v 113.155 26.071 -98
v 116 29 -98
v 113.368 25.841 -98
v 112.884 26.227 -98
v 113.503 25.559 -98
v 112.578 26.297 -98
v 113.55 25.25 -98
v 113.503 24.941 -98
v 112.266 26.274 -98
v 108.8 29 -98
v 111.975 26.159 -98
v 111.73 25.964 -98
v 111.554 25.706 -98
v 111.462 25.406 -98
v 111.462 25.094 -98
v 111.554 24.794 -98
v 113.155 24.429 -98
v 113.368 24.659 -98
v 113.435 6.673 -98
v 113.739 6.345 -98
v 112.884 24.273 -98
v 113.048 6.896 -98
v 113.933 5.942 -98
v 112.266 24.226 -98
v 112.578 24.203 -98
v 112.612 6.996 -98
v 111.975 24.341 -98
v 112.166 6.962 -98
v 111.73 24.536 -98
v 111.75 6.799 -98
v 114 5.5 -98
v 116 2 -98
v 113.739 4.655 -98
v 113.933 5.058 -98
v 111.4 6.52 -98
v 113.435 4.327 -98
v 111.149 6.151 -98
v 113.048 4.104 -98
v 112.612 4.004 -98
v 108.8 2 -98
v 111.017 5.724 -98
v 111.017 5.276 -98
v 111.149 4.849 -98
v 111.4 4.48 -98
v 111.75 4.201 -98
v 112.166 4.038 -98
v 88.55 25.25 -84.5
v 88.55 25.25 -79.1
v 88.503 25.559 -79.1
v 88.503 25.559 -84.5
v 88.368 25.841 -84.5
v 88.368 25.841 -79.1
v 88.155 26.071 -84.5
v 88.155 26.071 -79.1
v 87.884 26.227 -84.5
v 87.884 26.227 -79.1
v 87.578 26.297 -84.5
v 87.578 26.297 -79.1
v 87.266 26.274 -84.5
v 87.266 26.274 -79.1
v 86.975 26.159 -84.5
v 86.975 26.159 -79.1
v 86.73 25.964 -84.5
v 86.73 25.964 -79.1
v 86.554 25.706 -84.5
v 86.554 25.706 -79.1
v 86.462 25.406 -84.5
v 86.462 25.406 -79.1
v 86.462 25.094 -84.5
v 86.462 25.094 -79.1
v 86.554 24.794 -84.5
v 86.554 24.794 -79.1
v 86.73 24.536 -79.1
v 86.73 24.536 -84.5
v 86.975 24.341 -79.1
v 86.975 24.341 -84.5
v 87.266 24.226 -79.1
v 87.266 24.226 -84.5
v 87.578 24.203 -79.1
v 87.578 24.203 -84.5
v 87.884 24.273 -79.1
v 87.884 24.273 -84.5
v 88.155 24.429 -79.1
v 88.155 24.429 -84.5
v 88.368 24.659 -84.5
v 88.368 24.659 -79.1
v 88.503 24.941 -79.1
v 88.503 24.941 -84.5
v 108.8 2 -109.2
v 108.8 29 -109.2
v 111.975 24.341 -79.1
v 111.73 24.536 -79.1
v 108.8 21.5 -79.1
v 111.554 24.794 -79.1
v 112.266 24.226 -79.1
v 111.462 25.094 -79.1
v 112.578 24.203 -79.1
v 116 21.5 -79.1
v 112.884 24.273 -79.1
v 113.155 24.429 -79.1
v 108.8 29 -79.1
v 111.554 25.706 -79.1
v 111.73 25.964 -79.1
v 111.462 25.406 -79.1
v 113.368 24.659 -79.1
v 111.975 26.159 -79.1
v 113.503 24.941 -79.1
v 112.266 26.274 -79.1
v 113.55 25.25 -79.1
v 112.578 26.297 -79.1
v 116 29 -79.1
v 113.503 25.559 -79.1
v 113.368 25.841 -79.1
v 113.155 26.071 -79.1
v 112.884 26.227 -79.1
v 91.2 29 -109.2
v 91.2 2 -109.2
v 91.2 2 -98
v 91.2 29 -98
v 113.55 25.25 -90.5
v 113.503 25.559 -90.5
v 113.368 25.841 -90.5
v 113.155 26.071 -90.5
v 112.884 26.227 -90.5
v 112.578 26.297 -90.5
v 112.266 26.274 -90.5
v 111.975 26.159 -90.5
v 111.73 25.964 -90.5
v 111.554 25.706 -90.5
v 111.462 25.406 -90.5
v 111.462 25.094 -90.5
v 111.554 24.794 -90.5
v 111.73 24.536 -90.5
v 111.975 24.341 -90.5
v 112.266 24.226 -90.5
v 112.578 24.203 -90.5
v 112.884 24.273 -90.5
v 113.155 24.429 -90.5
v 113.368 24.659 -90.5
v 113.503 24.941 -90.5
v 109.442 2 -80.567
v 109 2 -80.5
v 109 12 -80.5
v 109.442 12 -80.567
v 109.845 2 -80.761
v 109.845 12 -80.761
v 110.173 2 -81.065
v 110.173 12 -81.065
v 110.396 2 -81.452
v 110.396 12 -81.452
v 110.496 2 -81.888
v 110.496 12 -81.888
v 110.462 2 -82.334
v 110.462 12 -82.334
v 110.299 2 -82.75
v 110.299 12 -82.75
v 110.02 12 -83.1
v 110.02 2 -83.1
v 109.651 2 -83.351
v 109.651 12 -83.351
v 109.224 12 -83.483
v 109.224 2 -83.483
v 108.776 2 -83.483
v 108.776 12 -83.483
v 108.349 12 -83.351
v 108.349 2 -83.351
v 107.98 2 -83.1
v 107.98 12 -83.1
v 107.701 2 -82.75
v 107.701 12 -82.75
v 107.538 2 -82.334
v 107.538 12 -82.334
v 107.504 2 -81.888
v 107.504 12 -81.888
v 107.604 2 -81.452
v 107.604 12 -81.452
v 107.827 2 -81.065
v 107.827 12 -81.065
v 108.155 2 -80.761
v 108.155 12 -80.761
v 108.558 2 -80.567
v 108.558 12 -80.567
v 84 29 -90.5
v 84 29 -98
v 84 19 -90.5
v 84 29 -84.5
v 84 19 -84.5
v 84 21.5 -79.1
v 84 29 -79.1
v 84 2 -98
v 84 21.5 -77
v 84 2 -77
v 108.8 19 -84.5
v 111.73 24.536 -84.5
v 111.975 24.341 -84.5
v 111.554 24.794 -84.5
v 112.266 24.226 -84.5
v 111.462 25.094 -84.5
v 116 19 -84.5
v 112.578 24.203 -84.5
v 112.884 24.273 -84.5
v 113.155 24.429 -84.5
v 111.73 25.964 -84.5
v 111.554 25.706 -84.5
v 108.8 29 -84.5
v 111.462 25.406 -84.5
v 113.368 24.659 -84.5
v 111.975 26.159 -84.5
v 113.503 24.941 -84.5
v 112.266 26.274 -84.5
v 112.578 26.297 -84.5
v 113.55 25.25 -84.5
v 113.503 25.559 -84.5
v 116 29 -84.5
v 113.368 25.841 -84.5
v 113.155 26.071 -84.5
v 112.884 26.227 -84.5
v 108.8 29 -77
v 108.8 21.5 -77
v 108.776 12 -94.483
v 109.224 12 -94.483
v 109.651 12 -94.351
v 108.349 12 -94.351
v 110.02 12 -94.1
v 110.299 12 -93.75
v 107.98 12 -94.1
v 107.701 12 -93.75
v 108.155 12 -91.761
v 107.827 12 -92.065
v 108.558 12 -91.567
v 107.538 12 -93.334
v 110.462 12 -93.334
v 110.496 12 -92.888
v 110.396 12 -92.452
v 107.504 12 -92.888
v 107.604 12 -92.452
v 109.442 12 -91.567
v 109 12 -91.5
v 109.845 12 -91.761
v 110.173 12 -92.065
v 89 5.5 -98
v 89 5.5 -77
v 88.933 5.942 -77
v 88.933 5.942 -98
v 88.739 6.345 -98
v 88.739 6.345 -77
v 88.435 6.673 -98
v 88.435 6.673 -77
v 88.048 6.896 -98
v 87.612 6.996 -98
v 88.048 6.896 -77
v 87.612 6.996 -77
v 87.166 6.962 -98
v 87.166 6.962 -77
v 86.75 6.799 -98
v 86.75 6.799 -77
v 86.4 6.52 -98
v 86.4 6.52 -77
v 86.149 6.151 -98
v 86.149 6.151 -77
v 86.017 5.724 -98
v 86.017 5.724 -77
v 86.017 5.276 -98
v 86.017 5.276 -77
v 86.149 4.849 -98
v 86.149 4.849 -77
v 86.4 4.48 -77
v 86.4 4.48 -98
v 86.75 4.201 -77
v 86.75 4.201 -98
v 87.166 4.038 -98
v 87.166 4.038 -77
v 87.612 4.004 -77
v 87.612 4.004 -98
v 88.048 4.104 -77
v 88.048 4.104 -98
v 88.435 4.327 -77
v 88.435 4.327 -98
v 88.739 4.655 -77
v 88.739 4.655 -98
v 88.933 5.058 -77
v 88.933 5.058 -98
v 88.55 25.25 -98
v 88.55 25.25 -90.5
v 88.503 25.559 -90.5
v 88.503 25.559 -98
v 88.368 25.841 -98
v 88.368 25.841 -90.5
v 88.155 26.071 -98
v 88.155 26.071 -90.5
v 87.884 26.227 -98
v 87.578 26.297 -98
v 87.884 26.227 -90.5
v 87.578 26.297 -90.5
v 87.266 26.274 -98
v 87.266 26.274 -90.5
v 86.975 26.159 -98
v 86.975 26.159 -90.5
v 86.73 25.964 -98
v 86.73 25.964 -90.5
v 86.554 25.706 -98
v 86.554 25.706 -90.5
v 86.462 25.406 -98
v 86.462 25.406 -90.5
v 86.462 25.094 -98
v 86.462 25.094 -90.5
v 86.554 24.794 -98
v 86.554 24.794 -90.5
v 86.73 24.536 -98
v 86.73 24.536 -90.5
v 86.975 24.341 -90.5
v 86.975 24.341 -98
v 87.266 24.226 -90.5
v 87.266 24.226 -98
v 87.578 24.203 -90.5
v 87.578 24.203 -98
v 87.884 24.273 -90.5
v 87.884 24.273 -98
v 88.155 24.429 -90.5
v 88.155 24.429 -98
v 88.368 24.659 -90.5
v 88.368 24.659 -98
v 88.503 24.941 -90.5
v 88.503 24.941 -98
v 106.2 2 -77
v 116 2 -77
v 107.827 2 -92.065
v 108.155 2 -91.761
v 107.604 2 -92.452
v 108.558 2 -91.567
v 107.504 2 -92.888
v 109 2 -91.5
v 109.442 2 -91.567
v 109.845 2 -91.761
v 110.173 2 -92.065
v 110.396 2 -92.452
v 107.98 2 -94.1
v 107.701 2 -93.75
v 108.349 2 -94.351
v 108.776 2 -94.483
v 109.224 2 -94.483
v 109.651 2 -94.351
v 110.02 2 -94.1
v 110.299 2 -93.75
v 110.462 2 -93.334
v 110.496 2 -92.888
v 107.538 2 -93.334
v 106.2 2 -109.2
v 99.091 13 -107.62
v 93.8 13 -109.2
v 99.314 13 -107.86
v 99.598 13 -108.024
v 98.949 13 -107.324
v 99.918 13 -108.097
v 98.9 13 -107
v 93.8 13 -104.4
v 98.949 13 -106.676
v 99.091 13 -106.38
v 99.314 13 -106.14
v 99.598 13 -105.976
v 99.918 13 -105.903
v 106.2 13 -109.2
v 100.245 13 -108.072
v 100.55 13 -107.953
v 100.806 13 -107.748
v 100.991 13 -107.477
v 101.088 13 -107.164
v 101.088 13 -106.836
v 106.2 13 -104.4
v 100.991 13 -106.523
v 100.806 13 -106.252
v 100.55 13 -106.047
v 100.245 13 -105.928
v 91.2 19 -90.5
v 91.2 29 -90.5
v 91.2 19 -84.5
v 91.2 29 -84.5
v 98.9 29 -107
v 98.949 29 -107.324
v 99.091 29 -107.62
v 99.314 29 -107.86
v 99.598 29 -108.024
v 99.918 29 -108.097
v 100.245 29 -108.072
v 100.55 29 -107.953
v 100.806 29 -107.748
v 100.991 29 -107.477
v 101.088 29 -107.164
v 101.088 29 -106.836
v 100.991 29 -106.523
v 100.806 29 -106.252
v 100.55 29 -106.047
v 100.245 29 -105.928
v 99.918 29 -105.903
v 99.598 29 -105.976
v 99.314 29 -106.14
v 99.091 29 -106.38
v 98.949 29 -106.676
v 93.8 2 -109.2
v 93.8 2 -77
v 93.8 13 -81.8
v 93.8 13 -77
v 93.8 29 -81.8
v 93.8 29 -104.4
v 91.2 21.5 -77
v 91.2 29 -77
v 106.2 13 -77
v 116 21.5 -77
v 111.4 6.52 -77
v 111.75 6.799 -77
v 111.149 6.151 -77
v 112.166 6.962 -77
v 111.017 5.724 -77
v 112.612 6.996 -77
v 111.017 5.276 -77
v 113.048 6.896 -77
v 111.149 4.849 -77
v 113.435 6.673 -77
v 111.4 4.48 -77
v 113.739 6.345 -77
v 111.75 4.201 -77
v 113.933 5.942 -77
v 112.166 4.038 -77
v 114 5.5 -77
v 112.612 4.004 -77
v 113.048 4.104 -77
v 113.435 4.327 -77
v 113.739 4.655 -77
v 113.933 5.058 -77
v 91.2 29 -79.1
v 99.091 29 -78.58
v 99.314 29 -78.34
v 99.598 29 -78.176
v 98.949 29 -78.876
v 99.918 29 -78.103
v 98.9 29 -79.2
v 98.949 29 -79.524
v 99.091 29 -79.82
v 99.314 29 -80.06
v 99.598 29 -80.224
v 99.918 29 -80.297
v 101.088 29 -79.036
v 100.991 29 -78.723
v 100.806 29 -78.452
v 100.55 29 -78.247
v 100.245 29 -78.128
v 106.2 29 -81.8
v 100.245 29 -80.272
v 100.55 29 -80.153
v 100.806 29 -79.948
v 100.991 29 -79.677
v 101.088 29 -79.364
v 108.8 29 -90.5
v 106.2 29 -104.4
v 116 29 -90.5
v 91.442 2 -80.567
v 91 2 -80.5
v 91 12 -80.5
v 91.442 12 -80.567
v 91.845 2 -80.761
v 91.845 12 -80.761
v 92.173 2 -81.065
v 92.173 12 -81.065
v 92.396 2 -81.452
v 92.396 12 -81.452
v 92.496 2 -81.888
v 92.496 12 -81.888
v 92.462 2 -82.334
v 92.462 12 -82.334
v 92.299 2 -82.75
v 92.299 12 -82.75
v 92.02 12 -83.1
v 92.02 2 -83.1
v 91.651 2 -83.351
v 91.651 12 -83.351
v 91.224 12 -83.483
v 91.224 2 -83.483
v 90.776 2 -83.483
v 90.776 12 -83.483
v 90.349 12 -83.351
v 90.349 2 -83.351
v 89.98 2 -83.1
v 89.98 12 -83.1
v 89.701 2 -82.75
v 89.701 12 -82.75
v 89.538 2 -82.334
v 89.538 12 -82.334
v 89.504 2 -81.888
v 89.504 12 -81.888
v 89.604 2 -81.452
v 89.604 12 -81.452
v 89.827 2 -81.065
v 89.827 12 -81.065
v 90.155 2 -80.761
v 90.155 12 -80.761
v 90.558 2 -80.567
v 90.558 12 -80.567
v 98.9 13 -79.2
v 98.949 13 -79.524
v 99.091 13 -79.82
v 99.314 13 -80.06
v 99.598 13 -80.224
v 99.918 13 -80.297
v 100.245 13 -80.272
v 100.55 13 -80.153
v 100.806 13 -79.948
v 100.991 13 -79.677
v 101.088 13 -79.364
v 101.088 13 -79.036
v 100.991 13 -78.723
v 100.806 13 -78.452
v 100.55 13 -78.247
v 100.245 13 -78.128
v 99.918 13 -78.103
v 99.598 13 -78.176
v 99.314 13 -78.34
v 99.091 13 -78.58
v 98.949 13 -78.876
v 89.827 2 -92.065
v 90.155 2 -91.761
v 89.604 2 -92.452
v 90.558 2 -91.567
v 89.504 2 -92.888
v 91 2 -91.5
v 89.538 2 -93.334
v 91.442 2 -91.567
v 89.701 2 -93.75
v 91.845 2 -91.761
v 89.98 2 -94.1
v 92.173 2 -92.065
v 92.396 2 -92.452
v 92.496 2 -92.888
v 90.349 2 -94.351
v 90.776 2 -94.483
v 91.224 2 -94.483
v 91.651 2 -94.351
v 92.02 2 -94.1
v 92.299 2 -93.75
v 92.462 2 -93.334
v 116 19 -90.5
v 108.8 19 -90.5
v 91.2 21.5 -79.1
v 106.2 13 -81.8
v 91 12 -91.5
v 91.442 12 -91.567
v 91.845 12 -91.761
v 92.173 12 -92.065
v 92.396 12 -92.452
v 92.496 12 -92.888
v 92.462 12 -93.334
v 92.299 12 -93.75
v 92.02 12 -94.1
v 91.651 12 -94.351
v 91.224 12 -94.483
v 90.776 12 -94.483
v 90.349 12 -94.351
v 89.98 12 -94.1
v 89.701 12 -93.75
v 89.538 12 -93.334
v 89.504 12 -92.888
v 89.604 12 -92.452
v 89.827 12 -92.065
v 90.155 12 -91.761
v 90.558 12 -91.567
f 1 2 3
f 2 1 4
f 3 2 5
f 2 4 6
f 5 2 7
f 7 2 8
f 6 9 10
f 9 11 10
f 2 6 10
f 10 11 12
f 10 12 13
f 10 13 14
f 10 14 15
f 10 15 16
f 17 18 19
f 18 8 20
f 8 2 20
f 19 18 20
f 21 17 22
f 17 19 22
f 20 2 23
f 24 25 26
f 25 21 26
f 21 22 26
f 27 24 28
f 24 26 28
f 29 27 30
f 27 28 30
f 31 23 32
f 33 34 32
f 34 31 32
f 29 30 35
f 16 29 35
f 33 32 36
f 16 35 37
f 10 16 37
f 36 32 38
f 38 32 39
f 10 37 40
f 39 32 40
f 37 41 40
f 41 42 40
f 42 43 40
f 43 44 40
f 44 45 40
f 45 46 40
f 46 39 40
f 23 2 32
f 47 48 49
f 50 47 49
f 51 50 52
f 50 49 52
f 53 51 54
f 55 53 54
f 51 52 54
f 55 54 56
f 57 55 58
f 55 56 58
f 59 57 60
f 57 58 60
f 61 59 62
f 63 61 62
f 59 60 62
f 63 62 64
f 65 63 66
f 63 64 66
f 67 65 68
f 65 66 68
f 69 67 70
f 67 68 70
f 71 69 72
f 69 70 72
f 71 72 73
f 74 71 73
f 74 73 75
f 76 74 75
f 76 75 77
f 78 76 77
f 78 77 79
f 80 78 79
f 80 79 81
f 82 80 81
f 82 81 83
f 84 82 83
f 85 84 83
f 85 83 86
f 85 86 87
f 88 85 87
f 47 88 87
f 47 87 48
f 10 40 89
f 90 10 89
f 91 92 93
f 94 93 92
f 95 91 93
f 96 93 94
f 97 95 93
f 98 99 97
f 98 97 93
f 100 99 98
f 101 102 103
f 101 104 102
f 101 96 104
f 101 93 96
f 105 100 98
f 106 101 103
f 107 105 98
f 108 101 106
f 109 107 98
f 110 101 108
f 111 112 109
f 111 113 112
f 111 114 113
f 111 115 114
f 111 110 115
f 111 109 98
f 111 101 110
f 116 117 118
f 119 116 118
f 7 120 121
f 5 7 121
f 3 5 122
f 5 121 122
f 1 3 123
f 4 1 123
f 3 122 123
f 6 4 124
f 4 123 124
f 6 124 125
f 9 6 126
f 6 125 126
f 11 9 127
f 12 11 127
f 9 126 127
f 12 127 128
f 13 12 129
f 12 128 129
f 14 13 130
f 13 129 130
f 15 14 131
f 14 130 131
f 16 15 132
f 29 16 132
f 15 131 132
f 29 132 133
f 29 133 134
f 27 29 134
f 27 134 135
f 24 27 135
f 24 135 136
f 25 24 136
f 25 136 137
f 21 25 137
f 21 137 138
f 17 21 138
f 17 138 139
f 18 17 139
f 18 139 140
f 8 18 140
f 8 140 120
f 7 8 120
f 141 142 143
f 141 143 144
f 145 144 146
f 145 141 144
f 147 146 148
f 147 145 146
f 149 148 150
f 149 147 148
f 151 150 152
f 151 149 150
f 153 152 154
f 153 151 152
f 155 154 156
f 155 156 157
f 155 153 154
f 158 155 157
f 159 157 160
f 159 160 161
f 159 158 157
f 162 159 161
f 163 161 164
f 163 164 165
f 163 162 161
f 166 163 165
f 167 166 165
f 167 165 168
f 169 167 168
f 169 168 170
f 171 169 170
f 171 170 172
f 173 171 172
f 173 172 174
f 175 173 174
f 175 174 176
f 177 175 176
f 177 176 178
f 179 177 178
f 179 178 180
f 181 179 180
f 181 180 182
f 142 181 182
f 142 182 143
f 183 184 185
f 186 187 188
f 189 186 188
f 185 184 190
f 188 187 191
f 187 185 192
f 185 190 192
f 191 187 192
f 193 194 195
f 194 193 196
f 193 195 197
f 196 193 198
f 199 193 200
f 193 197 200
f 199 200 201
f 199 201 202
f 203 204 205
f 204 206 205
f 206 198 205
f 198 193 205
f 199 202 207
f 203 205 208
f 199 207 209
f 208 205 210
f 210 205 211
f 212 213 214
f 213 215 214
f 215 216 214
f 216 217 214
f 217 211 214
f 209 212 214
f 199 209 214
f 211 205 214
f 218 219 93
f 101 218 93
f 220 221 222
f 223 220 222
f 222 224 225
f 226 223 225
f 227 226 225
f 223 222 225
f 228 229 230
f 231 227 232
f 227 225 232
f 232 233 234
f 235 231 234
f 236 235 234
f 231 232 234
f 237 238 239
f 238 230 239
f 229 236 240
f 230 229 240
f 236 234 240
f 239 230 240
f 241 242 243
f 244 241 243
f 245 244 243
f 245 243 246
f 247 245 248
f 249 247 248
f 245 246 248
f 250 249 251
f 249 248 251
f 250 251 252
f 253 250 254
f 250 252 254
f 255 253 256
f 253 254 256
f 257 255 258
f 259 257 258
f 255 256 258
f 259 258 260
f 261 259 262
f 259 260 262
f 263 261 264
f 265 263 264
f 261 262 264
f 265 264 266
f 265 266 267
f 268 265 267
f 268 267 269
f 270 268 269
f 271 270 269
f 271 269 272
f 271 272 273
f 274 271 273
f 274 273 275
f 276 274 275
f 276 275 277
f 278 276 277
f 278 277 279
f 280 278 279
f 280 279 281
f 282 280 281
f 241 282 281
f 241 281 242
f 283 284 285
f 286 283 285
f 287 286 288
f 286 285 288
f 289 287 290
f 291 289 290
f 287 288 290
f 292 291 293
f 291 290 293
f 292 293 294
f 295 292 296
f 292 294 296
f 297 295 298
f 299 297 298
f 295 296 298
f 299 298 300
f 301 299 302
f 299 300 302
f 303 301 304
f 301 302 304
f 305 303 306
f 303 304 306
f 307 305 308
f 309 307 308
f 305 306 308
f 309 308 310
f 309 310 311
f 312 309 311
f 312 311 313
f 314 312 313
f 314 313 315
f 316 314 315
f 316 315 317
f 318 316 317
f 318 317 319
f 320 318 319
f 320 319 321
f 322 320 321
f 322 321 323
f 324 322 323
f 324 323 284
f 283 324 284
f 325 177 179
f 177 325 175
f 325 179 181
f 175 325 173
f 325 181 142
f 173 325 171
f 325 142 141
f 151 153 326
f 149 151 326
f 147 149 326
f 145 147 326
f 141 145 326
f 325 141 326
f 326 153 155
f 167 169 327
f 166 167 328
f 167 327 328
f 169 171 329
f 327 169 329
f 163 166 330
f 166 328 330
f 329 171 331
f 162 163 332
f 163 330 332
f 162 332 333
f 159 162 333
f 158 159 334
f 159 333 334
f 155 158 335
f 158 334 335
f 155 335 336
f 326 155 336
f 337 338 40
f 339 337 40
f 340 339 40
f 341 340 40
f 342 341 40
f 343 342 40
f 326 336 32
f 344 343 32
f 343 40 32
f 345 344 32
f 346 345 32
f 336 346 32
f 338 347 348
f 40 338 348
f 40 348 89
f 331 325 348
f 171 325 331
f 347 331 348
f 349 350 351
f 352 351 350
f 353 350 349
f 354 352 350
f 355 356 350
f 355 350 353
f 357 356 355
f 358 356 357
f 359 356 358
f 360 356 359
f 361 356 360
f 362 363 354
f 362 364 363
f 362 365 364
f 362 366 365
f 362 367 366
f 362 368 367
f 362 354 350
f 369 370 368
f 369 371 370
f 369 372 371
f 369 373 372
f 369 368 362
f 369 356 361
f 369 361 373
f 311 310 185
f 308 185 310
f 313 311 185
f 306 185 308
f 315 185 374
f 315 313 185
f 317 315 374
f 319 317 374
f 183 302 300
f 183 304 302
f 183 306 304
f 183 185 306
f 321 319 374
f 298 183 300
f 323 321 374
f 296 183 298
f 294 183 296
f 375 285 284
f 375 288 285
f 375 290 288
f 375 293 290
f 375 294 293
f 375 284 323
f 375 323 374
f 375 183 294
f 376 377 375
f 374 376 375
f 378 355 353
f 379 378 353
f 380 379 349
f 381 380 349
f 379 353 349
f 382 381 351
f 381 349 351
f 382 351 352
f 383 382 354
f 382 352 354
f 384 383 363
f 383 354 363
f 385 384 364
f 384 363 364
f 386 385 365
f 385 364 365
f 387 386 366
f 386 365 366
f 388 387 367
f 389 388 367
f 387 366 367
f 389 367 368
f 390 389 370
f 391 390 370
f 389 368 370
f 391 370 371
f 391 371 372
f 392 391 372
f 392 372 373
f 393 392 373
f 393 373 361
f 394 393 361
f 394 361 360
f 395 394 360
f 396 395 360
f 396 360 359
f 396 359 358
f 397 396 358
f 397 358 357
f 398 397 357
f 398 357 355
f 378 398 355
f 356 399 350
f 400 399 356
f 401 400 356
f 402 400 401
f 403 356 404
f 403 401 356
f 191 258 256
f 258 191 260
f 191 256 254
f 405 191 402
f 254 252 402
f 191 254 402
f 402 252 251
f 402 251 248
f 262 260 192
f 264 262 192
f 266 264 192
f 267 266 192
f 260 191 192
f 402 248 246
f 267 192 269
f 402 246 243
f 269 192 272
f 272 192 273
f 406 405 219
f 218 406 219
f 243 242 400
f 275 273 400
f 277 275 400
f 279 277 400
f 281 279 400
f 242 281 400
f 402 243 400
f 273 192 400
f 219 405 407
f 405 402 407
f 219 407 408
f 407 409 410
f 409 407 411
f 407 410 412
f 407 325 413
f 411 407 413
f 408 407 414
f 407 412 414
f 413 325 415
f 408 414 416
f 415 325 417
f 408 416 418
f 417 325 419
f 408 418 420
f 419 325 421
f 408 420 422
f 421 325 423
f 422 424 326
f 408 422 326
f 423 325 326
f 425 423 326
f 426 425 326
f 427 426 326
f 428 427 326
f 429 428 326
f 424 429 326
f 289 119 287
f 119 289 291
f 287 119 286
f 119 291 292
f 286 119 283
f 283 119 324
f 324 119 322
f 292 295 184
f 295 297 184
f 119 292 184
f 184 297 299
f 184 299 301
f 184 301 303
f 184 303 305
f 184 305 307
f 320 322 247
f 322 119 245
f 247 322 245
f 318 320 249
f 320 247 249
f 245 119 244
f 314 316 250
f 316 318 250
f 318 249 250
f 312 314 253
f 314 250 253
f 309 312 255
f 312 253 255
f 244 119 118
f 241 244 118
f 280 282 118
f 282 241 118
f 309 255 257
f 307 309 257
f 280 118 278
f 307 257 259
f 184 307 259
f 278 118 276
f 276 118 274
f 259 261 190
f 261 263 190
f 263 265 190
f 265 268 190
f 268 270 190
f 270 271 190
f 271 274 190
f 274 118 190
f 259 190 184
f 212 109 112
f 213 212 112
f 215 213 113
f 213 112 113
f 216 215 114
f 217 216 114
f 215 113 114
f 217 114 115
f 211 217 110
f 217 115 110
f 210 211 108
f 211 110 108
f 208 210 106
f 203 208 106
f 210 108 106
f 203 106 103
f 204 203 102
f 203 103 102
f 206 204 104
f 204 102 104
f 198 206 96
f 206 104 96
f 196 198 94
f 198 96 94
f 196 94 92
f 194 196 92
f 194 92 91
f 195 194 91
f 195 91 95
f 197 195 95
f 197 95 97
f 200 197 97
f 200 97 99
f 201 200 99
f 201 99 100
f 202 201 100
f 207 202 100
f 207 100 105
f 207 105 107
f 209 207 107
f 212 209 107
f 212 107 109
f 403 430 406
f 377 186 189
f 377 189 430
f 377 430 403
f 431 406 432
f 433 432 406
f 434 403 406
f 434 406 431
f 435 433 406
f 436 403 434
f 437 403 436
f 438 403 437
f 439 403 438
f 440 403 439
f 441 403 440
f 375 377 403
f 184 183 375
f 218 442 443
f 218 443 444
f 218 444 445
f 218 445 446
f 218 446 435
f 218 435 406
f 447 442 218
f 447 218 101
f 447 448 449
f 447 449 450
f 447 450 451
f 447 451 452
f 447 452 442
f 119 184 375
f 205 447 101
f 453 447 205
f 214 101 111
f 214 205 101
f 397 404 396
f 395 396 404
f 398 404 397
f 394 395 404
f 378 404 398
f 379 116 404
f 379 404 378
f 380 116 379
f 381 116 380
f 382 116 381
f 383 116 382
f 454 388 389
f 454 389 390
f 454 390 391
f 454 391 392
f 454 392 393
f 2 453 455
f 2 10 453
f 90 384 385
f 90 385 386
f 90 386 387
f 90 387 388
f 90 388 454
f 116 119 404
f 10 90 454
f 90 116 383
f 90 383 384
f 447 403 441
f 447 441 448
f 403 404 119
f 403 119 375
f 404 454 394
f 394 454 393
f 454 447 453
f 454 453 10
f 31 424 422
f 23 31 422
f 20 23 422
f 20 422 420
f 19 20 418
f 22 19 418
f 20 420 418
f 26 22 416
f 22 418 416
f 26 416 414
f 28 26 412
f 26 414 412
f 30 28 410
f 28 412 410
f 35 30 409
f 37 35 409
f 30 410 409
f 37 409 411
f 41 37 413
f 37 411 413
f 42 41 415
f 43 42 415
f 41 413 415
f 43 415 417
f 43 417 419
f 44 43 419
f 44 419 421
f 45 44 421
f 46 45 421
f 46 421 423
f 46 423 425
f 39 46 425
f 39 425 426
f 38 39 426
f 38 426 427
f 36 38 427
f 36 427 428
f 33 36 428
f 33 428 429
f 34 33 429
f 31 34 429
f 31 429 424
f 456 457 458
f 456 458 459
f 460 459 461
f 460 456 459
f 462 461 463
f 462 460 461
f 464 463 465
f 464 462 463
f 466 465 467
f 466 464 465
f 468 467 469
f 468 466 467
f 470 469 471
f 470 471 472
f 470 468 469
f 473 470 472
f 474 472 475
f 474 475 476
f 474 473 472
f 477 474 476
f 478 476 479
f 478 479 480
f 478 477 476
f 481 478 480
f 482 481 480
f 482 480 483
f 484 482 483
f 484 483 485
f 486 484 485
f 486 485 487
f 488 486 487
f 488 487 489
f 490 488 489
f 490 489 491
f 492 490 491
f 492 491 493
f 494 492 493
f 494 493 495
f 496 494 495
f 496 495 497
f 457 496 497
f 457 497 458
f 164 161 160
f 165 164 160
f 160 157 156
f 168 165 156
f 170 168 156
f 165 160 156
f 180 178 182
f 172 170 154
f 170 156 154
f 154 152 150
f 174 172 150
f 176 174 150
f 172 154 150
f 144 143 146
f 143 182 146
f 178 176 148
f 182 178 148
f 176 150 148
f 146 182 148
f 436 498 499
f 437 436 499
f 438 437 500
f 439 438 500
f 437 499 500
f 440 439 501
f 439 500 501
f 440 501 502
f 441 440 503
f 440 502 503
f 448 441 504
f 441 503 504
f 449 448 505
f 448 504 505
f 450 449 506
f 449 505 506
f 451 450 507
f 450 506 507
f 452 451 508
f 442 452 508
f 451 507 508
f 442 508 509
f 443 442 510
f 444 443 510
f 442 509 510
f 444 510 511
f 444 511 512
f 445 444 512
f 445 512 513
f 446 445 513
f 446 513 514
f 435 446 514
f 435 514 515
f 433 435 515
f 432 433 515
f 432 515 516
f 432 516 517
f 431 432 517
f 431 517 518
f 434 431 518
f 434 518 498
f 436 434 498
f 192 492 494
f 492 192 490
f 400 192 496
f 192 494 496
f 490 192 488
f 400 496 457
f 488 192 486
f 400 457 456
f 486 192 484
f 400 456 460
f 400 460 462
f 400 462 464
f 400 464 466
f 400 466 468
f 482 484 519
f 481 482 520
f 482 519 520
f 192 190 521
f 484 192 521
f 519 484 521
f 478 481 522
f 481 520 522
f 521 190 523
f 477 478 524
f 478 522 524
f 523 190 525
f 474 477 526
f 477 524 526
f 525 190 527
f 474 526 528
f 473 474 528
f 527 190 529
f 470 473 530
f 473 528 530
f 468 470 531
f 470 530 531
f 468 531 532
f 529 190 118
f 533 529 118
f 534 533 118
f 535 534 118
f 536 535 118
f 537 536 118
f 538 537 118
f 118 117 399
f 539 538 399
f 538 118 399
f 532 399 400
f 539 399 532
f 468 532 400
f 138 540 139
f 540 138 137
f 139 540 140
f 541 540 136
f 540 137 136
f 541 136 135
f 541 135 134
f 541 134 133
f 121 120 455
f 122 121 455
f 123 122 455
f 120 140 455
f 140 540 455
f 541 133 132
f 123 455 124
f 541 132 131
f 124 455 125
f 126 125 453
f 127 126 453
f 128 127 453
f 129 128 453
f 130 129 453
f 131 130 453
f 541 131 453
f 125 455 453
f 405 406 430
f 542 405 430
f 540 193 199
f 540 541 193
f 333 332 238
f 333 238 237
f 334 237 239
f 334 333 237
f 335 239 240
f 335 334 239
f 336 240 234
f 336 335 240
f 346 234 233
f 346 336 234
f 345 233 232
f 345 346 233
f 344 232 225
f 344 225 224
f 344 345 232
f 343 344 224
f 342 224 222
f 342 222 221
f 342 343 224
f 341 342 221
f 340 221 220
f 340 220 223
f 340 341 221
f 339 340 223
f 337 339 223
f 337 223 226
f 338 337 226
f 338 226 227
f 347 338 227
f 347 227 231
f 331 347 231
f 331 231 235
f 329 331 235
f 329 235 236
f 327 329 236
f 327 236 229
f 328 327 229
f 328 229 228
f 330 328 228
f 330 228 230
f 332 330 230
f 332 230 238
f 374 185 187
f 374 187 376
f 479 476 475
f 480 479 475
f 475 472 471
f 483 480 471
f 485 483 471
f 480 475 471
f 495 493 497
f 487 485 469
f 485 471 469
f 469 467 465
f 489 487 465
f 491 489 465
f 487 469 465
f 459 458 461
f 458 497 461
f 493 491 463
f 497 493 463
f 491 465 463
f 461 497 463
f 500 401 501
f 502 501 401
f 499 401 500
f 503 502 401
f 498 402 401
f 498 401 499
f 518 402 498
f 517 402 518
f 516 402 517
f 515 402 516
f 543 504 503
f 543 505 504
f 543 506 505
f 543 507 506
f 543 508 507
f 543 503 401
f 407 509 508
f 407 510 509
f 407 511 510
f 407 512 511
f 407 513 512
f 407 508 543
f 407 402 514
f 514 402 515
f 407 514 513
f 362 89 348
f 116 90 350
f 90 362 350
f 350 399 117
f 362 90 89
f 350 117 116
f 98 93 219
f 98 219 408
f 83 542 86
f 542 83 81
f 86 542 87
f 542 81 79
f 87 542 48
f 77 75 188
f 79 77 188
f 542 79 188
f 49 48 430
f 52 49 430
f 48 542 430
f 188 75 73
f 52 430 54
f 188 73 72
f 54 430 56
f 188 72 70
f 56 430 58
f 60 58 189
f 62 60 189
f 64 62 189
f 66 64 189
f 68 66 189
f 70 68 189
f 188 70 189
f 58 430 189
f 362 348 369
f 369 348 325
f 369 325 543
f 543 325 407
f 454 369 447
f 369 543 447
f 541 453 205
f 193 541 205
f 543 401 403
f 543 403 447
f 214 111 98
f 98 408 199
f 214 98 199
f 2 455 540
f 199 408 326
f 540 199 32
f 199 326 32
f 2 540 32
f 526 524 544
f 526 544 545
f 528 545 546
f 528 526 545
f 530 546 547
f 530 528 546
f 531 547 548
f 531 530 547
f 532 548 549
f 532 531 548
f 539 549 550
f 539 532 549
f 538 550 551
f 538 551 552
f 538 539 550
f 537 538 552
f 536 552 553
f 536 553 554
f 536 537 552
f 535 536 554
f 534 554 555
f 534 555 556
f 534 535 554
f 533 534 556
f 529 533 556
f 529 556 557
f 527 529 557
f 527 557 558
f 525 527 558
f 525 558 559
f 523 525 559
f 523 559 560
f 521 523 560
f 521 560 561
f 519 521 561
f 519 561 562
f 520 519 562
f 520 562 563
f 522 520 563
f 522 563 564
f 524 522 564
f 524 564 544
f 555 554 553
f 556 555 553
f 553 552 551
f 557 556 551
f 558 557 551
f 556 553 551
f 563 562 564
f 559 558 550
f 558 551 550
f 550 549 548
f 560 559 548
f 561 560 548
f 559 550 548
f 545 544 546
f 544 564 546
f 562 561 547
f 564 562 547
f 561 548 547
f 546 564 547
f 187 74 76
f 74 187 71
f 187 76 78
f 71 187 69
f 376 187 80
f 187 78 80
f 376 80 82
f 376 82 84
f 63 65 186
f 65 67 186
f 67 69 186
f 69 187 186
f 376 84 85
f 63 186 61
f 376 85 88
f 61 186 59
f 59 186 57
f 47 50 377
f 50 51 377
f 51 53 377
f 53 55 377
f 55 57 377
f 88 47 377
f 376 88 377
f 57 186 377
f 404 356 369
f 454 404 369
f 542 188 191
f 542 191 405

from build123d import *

# Parameters (mm, degrees)
BOSS_EXTRUDE2_START        = 2
SKETCH1_W                  = 12.4
SKETCH1_H                  = 22.6
BOSS_EXTRUDE2_DEPTH        = 27
SKETCH2_W                  = 7.2
SKETCH2_H                  = 2.1
CUT_EXTRUDE1_DEPTH         = 7.5
SKETCH3_W                  = 12.4
SKETCH3_H                  = 11
CUT_EXTRUDE2_DEPTH         = 124.829883308
CUT_EXTRUDE2_DEPTH_BACK    = 124.829883308
SKETCH2_3_W                = 7.2
SKETCH2_3_H                = 6
CUT_EXTRUDE3_DEPTH         = 10
SKETCH7_R                  = 1.05
SKETCH7_R_2                = 1.5
CUT_EXTRUDE9_DEPTH         = 124.829883308
SKETCH1_8_R                = 1.5
CUT_EXTRUDE12_DEPTH        = 12
F_2_2_2_2_DIAMETER_HOLE1_D = 2.2


with BuildPart() as part:
    # Sketch1 → Boss-Extrude2 (new body)
    with BuildSketch(Plane(origin=(0, 0, 0), x_dir=(1, 0, 0), z_dir=(0, 1, 0)).offset(BOSS_EXTRUDE2_START)):
        Polygon((84, 98), (84, 77), (116, 77), (116, 98), (108.8, 98), (108.8, 109.2), (91.2, 109.2), (91.2, 98), align=None)
        with Locations((100, 93.1)):
            Rectangle(SKETCH1_W, SKETCH1_H, mode=Mode.SUBTRACT)
    extrude(amount=BOSS_EXTRUDE2_DEPTH)

    # Sketch2 → Cut-Extrude1 (cut)
    with BuildSketch(Plane(origin=(0, 29, 0), x_dir=(1, 0, 0), z_dir=(0, 1, 0))):
        with Locations((112.4, 78.05)):
            Rectangle(SKETCH2_W, SKETCH2_H)
        Polygon((84, 79.1), (84, 78.995319666), (84, 77), (91.2, 77), (91.2, 79.1), align=None)
    extrude(amount=-CUT_EXTRUDE1_DEPTH, mode=Mode.SUBTRACT)

    # Sketch3 → Cut-Extrude2 (cut, two sides)
    with BuildSketch(Plane.XY.offset(-77)) as cut_extrude2_sk:
        with Locations((100, 7.5)):
            Rectangle(SKETCH3_W, SKETCH3_H)
    extrude(amount=CUT_EXTRUDE2_DEPTH, mode=Mode.SUBTRACT)
    extrude(cut_extrude2_sk.sketch, amount=-CUT_EXTRUDE2_DEPTH_BACK, mode=Mode.SUBTRACT)

    # Sketch2<3> → Cut-Extrude3 (cut)
    with BuildSketch(Plane(origin=(0, 29, 0), x_dir=(1, 0, 0), z_dir=(0, 1, 0))):
        Polygon((108.8, 84.5), (116, 84.5), (116, 85.211636412), (116, 90.5), (108.8, 90.5), align=None)
        with Locations((87.6, 87.5)):
            Rectangle(SKETCH2_3_W, SKETCH2_3_H)
    extrude(amount=-CUT_EXTRUDE3_DEPTH, mode=Mode.SUBTRACT)

    # Sketch7 → Cut-Extrude9 (cut, through all)
    with BuildSketch(Plane.XY.offset(-77)):
        with Locations((87.5, 25.25)):
            Circle(SKETCH7_R)
        with Locations((112.5, 25.25)):
            Circle(SKETCH7_R)
        with Locations((87.5, 5.5)):
            Circle(SKETCH7_R_2)
        with Locations((112.5, 5.5)):
            Circle(SKETCH7_R_2)
    extrude(amount=-CUT_EXTRUDE9_DEPTH, mode=Mode.SUBTRACT)

    # Sketch1<8> → Cut-Extrude12 (cut)
    with BuildSketch(Plane(origin=(0, 0, 0), x_dir=(1, 0, 0), z_dir=(0, 1, 0))):
        with Locations(Location((109, 82, 0), (0, 0, 270))):
            Circle(SKETCH1_8_R)
        with Locations(Location((109, 93, 0), (0, 0, 270))):
            Circle(SKETCH1_8_R)
        with Locations(Location((91, 82, 0), (0, 0, 270))):
            Circle(SKETCH1_8_R)
        with Locations(Location((91, 93, 0), (0, 0, 270))):
            Circle(SKETCH1_8_R)
    extrude(amount=CUT_EXTRUDE12_DEPTH, mode=Mode.SUBTRACT)

    # Ø2.2 (2.2) Diameter Hole1 (through all)
    with Locations(Plane(origin=(0, 29, 0), x_dir=(1, 0, 0), z_dir=(0, 1, 0))):
        with Locations((100, 79.2), (100, 107)):
            Hole(F_2_2_2_2_DIAMETER_HOLE1_D / 2)


solid = part.part
